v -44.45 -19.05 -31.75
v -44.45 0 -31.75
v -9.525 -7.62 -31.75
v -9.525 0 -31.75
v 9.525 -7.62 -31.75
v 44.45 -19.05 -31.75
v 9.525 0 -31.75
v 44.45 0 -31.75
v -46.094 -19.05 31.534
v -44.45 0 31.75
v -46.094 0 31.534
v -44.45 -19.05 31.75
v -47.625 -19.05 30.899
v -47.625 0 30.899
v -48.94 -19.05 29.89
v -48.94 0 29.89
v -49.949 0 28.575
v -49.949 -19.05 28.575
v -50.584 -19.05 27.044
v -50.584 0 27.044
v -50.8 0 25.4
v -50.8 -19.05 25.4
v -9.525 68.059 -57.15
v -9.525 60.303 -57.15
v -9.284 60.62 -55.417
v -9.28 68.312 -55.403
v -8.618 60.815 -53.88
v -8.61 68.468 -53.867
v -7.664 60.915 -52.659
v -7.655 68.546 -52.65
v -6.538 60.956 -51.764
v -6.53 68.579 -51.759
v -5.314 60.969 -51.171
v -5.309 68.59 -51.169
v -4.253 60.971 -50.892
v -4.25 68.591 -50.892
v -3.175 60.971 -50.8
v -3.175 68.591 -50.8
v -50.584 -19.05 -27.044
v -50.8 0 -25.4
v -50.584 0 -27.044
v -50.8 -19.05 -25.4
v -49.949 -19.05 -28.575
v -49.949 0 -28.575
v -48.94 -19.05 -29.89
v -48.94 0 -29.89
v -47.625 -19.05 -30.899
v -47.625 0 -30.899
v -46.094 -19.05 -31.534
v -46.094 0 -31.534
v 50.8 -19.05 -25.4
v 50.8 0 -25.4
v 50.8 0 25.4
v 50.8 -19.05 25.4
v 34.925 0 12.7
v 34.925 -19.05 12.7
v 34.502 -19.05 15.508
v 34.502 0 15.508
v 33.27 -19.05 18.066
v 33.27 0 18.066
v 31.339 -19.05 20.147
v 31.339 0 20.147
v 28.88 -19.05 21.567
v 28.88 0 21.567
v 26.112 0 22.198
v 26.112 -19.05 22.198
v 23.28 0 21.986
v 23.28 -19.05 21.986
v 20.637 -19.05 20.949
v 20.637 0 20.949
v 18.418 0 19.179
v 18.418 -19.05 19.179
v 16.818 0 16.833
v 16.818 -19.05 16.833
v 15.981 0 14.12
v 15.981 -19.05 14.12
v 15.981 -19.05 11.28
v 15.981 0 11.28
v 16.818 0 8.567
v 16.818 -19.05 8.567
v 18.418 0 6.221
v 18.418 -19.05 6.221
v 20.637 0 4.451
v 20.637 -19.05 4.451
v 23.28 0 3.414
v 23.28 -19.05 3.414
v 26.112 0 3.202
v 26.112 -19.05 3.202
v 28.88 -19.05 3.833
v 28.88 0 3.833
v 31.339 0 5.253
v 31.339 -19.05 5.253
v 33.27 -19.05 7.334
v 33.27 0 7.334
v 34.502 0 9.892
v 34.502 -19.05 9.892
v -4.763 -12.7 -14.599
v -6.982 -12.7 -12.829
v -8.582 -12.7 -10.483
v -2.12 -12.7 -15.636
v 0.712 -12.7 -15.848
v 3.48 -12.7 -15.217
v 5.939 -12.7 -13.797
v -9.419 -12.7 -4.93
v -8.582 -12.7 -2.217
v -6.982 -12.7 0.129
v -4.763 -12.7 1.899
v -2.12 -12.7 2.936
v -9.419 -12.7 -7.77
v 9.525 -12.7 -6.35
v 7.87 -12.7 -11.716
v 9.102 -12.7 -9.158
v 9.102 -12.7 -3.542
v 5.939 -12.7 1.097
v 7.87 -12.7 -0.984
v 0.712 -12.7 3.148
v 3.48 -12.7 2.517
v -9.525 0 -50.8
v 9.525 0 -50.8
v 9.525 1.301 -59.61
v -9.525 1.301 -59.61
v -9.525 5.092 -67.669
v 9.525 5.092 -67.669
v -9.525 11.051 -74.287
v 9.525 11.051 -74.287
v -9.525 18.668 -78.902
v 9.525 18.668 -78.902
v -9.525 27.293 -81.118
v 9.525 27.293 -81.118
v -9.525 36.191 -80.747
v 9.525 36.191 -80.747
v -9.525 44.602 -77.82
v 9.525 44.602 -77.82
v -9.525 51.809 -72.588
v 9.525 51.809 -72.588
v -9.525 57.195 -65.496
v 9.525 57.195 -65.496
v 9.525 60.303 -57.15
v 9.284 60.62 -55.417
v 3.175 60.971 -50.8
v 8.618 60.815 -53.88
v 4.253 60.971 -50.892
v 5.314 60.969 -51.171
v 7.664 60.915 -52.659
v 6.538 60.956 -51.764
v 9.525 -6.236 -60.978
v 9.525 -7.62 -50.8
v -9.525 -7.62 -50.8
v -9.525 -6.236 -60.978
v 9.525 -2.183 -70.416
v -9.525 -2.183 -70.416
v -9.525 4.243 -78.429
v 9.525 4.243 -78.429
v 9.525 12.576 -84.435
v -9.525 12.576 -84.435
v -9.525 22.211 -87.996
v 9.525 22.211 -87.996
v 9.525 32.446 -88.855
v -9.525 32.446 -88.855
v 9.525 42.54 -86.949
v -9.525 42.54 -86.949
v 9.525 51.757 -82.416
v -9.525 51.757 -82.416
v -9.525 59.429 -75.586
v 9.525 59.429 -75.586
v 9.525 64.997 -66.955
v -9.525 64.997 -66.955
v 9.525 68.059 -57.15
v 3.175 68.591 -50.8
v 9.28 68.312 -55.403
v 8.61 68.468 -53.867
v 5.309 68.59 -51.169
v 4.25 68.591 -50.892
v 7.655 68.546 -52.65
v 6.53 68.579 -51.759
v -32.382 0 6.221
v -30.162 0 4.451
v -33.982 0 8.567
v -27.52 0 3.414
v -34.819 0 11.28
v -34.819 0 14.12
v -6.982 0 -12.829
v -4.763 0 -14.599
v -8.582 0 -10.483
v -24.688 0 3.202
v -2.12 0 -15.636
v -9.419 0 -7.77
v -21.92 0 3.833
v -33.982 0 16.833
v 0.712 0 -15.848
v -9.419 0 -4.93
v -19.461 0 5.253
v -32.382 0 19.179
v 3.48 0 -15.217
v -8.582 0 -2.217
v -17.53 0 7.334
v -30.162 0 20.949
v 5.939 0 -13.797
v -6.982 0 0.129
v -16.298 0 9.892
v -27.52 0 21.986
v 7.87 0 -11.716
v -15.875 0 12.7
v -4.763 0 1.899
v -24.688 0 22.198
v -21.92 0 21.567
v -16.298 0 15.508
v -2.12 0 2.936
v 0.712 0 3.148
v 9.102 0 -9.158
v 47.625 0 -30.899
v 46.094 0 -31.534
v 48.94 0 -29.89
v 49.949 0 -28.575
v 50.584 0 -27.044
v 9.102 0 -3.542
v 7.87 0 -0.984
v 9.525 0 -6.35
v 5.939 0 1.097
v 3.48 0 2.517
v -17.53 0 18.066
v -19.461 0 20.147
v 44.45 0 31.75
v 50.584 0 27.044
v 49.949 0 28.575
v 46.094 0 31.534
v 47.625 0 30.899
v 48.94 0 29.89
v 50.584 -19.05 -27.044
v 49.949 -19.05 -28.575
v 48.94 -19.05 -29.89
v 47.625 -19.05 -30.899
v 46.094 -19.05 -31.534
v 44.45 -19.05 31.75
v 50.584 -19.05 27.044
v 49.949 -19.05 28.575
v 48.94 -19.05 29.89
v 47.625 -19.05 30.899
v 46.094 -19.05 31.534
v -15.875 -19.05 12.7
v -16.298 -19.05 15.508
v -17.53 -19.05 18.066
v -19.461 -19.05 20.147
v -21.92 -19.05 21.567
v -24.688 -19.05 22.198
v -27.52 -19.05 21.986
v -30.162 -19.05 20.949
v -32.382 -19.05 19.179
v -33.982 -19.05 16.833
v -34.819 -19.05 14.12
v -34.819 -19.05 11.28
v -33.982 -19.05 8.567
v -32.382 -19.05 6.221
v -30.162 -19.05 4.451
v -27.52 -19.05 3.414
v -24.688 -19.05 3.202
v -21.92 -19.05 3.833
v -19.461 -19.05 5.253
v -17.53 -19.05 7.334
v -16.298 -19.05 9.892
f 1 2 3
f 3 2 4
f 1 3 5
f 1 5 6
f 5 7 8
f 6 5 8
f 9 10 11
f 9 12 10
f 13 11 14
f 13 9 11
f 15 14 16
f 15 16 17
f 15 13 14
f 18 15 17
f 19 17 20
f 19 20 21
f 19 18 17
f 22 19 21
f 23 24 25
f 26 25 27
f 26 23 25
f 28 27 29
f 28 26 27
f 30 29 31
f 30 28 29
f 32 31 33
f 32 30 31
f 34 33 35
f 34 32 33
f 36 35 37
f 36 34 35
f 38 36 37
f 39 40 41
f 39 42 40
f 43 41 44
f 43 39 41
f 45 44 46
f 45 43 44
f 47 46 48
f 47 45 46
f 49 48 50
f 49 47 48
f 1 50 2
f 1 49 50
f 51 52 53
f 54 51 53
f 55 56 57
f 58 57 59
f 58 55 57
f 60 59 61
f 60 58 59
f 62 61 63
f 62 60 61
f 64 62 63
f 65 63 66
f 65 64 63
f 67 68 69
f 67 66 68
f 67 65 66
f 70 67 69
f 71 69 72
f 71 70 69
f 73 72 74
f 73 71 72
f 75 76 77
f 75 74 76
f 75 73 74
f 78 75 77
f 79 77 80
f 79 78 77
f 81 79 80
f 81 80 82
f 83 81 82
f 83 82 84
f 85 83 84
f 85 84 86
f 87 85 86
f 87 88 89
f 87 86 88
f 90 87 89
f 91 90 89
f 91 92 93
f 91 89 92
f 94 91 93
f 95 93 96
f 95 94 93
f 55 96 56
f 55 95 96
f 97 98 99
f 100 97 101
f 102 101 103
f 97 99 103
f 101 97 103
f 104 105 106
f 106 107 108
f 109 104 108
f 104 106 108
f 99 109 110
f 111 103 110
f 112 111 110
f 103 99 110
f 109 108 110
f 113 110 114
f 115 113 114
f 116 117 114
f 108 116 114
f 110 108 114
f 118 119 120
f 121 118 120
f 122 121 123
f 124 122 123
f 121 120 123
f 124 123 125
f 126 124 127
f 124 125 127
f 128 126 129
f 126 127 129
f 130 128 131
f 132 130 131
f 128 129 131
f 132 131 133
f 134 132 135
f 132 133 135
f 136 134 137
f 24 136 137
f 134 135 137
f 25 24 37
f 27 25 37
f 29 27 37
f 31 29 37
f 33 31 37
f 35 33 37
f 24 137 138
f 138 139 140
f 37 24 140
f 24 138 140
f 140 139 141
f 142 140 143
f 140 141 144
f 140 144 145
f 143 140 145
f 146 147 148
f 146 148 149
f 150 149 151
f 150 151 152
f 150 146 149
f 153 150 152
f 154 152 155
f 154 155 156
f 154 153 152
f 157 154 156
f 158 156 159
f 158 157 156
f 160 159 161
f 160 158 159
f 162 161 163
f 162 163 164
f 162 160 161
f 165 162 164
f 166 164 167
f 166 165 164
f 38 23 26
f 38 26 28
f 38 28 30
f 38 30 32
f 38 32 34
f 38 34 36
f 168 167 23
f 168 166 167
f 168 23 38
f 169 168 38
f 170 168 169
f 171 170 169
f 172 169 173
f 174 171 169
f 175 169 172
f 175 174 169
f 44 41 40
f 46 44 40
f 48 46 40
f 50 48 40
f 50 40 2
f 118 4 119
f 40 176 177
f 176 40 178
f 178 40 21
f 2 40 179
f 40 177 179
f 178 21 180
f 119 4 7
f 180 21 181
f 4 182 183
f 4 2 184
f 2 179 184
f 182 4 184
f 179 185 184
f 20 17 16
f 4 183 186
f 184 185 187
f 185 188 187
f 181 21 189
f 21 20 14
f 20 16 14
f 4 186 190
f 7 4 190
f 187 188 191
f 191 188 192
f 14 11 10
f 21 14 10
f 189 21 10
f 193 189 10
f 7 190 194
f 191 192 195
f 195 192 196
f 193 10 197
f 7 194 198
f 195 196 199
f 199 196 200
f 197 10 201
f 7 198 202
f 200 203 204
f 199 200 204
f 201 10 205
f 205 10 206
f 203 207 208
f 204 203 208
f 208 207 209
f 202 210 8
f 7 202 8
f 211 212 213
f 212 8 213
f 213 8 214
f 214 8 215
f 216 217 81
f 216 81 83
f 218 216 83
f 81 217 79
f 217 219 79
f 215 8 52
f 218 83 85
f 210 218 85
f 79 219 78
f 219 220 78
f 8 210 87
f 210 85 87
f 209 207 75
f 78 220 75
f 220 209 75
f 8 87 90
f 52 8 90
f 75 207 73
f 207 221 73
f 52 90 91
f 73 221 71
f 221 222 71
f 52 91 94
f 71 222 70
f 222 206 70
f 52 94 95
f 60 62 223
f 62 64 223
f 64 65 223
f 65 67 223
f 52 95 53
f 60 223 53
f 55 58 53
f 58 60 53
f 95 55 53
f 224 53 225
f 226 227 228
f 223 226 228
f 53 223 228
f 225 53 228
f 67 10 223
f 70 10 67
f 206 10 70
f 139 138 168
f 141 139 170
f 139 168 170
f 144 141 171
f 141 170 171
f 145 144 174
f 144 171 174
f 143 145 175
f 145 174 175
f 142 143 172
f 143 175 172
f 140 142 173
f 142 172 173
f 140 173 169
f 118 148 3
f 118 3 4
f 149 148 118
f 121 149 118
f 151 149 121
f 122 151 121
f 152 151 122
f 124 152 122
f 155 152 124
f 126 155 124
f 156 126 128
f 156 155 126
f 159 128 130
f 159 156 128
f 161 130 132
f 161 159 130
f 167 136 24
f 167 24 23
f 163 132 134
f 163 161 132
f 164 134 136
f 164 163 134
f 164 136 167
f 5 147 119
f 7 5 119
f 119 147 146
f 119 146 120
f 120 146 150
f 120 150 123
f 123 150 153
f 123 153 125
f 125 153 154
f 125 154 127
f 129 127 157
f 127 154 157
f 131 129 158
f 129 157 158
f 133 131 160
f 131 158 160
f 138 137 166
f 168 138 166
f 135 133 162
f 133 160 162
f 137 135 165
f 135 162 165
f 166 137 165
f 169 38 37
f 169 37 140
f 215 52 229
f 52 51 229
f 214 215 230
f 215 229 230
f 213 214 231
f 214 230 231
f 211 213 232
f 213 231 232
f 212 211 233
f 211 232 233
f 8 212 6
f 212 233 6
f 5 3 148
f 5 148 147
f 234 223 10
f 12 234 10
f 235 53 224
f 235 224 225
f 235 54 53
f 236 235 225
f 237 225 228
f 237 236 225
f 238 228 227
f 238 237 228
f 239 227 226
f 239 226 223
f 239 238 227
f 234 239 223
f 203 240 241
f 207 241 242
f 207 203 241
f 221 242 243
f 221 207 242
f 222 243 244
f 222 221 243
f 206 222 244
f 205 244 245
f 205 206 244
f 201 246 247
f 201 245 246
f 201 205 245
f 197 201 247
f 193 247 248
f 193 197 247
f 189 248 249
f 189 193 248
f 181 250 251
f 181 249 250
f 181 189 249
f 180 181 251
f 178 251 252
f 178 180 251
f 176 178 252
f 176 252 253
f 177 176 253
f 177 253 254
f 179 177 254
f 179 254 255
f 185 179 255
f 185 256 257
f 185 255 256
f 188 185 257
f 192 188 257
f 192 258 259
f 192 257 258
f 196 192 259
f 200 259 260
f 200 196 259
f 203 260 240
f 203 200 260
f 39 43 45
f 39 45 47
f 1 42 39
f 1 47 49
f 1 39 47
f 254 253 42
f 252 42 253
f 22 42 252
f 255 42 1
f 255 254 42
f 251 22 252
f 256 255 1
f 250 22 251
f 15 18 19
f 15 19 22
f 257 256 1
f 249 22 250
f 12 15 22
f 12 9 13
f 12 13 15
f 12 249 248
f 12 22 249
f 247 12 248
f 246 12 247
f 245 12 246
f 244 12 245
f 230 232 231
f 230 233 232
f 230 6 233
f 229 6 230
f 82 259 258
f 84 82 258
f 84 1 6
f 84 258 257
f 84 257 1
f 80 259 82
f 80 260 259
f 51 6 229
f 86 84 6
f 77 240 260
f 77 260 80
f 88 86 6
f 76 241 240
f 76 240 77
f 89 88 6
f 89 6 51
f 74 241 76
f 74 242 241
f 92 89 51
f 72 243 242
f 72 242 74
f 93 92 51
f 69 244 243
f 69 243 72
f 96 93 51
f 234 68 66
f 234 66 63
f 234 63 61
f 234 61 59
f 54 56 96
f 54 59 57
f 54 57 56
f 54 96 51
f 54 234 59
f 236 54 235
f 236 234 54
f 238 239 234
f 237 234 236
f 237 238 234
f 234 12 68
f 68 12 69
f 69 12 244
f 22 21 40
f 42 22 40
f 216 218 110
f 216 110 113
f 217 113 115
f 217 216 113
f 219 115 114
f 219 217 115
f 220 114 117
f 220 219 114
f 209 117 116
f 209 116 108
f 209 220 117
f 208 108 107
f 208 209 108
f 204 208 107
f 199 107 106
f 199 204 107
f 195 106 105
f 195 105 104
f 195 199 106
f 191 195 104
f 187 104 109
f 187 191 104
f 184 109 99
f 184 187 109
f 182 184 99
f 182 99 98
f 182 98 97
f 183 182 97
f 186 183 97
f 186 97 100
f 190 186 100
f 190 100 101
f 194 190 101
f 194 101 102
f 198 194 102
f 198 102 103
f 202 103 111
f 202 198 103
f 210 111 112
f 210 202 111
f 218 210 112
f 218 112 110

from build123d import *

# Parameters (mm, degrees)
F1_DEPTH    = 19.05
F2_R        = 6.35
F0_W        = 19.05
F0_H        = 19.05
F3_DEPTH    = 7.62
F4_W        = 19.05
F4_H        = 7.62
F5_ANGLE    = 180
F6_T1_DEPTH = 39.37
F7_R        = 9.525
F8_DEPTH    = 19.051
F9_R        = 9.525
F10_DEPTH   = 12.7


# Not quite as in the source:
# - a fillet or chamfer that OpenCascade refuses, or shapes differently, is made with other operations: its cross-section is extruded or revolved along the edge and cut away or added


with BuildPart() as f1:
    # F0 (on Front) → F1 (new body)
    with BuildSketch(Plane.XZ):
        Polygon((50.8, -31.75), (50.8, 31.75), (-50.8, 31.75), (-50.8, -31.75), (-9.525, -31.75), (9.525, -31.75), align=None)
    extrude(amount=F1_DEPTH)

    # F2
    f2_edges = [f1.edges().sort_by_distance(p)[0] for p in [
        (50.8, -9.525, 31.75),
        (50.8, -9.525, -31.75),
        (-50.8, -9.525, -31.75),
        (-50.8, -9.525, 31.75),
    ]]
    fillet(f2_edges, radius=F2_R)

    # F0 (on Front) → F3 (join)
    with BuildSketch(Plane.XZ):
        with Locations((0, -41.275)):
            Rectangle(F0_W, F0_H)
    extrude(amount=F3_DEPTH)

    # F4 (on face) → F5 (revolve)
    with BuildSketch(Plane(origin=(0, 0, -50.8), x_dir=(1, 0, 0), z_dir=(0, 0, -1))):
        with Locations((0, 3.81)):
            Rectangle(F4_W, F4_H)
    revolve(axis=Axis((-4.1156476188, 30.4856614615, -50.8), (1, 0, 0)), revolution_arc=F5_ANGLE)

    # F6: fillet of radius 6.35 on 3 edges, made by hand

    # F6_s2 → F6_t1 (cut)
    with BuildSketch(Plane.XZ.offset(-84.4663229229)):
        with BuildLine():
            ThreePointArc((-9.525, -57.15), (-7.6651280605, -52.6598719395), (-3.175, -50.8))
            Line((-3.175, -50.8), (-9.525, -50.8))
            Line((-9.525, -50.8), (-9.525, -57.15))
        make_face()
        with BuildLine():
            ThreePointArc((9.525, -57.15), (7.6651280605, -52.6598719395), (3.175, -50.8))
            Line((3.175, -50.8), (9.525, -50.8))
            Line((9.525, -50.8), (9.525, -57.15))
        make_face()
    extrude(amount=F6_T1_DEPTH, mode=Mode.SUBTRACT)

    # F7 (on face) → F8 (cut, through all)
    with BuildSketch(Plane.XZ):
        with Locations((-25.4, 12.7)):
            Circle(F7_R)
        with Locations((25.4, 12.7)):
            Circle(F7_R)
    extrude(amount=F8_DEPTH, mode=Mode.SUBTRACT)

    # F9 (on face) → F10 (cut)
    with BuildSketch(Plane.XZ):
        with Locations((0, -6.35)):
            Circle(F9_R)
    extrude(amount=F10_DEPTH, mode=Mode.SUBTRACT)


solid = f1.part
